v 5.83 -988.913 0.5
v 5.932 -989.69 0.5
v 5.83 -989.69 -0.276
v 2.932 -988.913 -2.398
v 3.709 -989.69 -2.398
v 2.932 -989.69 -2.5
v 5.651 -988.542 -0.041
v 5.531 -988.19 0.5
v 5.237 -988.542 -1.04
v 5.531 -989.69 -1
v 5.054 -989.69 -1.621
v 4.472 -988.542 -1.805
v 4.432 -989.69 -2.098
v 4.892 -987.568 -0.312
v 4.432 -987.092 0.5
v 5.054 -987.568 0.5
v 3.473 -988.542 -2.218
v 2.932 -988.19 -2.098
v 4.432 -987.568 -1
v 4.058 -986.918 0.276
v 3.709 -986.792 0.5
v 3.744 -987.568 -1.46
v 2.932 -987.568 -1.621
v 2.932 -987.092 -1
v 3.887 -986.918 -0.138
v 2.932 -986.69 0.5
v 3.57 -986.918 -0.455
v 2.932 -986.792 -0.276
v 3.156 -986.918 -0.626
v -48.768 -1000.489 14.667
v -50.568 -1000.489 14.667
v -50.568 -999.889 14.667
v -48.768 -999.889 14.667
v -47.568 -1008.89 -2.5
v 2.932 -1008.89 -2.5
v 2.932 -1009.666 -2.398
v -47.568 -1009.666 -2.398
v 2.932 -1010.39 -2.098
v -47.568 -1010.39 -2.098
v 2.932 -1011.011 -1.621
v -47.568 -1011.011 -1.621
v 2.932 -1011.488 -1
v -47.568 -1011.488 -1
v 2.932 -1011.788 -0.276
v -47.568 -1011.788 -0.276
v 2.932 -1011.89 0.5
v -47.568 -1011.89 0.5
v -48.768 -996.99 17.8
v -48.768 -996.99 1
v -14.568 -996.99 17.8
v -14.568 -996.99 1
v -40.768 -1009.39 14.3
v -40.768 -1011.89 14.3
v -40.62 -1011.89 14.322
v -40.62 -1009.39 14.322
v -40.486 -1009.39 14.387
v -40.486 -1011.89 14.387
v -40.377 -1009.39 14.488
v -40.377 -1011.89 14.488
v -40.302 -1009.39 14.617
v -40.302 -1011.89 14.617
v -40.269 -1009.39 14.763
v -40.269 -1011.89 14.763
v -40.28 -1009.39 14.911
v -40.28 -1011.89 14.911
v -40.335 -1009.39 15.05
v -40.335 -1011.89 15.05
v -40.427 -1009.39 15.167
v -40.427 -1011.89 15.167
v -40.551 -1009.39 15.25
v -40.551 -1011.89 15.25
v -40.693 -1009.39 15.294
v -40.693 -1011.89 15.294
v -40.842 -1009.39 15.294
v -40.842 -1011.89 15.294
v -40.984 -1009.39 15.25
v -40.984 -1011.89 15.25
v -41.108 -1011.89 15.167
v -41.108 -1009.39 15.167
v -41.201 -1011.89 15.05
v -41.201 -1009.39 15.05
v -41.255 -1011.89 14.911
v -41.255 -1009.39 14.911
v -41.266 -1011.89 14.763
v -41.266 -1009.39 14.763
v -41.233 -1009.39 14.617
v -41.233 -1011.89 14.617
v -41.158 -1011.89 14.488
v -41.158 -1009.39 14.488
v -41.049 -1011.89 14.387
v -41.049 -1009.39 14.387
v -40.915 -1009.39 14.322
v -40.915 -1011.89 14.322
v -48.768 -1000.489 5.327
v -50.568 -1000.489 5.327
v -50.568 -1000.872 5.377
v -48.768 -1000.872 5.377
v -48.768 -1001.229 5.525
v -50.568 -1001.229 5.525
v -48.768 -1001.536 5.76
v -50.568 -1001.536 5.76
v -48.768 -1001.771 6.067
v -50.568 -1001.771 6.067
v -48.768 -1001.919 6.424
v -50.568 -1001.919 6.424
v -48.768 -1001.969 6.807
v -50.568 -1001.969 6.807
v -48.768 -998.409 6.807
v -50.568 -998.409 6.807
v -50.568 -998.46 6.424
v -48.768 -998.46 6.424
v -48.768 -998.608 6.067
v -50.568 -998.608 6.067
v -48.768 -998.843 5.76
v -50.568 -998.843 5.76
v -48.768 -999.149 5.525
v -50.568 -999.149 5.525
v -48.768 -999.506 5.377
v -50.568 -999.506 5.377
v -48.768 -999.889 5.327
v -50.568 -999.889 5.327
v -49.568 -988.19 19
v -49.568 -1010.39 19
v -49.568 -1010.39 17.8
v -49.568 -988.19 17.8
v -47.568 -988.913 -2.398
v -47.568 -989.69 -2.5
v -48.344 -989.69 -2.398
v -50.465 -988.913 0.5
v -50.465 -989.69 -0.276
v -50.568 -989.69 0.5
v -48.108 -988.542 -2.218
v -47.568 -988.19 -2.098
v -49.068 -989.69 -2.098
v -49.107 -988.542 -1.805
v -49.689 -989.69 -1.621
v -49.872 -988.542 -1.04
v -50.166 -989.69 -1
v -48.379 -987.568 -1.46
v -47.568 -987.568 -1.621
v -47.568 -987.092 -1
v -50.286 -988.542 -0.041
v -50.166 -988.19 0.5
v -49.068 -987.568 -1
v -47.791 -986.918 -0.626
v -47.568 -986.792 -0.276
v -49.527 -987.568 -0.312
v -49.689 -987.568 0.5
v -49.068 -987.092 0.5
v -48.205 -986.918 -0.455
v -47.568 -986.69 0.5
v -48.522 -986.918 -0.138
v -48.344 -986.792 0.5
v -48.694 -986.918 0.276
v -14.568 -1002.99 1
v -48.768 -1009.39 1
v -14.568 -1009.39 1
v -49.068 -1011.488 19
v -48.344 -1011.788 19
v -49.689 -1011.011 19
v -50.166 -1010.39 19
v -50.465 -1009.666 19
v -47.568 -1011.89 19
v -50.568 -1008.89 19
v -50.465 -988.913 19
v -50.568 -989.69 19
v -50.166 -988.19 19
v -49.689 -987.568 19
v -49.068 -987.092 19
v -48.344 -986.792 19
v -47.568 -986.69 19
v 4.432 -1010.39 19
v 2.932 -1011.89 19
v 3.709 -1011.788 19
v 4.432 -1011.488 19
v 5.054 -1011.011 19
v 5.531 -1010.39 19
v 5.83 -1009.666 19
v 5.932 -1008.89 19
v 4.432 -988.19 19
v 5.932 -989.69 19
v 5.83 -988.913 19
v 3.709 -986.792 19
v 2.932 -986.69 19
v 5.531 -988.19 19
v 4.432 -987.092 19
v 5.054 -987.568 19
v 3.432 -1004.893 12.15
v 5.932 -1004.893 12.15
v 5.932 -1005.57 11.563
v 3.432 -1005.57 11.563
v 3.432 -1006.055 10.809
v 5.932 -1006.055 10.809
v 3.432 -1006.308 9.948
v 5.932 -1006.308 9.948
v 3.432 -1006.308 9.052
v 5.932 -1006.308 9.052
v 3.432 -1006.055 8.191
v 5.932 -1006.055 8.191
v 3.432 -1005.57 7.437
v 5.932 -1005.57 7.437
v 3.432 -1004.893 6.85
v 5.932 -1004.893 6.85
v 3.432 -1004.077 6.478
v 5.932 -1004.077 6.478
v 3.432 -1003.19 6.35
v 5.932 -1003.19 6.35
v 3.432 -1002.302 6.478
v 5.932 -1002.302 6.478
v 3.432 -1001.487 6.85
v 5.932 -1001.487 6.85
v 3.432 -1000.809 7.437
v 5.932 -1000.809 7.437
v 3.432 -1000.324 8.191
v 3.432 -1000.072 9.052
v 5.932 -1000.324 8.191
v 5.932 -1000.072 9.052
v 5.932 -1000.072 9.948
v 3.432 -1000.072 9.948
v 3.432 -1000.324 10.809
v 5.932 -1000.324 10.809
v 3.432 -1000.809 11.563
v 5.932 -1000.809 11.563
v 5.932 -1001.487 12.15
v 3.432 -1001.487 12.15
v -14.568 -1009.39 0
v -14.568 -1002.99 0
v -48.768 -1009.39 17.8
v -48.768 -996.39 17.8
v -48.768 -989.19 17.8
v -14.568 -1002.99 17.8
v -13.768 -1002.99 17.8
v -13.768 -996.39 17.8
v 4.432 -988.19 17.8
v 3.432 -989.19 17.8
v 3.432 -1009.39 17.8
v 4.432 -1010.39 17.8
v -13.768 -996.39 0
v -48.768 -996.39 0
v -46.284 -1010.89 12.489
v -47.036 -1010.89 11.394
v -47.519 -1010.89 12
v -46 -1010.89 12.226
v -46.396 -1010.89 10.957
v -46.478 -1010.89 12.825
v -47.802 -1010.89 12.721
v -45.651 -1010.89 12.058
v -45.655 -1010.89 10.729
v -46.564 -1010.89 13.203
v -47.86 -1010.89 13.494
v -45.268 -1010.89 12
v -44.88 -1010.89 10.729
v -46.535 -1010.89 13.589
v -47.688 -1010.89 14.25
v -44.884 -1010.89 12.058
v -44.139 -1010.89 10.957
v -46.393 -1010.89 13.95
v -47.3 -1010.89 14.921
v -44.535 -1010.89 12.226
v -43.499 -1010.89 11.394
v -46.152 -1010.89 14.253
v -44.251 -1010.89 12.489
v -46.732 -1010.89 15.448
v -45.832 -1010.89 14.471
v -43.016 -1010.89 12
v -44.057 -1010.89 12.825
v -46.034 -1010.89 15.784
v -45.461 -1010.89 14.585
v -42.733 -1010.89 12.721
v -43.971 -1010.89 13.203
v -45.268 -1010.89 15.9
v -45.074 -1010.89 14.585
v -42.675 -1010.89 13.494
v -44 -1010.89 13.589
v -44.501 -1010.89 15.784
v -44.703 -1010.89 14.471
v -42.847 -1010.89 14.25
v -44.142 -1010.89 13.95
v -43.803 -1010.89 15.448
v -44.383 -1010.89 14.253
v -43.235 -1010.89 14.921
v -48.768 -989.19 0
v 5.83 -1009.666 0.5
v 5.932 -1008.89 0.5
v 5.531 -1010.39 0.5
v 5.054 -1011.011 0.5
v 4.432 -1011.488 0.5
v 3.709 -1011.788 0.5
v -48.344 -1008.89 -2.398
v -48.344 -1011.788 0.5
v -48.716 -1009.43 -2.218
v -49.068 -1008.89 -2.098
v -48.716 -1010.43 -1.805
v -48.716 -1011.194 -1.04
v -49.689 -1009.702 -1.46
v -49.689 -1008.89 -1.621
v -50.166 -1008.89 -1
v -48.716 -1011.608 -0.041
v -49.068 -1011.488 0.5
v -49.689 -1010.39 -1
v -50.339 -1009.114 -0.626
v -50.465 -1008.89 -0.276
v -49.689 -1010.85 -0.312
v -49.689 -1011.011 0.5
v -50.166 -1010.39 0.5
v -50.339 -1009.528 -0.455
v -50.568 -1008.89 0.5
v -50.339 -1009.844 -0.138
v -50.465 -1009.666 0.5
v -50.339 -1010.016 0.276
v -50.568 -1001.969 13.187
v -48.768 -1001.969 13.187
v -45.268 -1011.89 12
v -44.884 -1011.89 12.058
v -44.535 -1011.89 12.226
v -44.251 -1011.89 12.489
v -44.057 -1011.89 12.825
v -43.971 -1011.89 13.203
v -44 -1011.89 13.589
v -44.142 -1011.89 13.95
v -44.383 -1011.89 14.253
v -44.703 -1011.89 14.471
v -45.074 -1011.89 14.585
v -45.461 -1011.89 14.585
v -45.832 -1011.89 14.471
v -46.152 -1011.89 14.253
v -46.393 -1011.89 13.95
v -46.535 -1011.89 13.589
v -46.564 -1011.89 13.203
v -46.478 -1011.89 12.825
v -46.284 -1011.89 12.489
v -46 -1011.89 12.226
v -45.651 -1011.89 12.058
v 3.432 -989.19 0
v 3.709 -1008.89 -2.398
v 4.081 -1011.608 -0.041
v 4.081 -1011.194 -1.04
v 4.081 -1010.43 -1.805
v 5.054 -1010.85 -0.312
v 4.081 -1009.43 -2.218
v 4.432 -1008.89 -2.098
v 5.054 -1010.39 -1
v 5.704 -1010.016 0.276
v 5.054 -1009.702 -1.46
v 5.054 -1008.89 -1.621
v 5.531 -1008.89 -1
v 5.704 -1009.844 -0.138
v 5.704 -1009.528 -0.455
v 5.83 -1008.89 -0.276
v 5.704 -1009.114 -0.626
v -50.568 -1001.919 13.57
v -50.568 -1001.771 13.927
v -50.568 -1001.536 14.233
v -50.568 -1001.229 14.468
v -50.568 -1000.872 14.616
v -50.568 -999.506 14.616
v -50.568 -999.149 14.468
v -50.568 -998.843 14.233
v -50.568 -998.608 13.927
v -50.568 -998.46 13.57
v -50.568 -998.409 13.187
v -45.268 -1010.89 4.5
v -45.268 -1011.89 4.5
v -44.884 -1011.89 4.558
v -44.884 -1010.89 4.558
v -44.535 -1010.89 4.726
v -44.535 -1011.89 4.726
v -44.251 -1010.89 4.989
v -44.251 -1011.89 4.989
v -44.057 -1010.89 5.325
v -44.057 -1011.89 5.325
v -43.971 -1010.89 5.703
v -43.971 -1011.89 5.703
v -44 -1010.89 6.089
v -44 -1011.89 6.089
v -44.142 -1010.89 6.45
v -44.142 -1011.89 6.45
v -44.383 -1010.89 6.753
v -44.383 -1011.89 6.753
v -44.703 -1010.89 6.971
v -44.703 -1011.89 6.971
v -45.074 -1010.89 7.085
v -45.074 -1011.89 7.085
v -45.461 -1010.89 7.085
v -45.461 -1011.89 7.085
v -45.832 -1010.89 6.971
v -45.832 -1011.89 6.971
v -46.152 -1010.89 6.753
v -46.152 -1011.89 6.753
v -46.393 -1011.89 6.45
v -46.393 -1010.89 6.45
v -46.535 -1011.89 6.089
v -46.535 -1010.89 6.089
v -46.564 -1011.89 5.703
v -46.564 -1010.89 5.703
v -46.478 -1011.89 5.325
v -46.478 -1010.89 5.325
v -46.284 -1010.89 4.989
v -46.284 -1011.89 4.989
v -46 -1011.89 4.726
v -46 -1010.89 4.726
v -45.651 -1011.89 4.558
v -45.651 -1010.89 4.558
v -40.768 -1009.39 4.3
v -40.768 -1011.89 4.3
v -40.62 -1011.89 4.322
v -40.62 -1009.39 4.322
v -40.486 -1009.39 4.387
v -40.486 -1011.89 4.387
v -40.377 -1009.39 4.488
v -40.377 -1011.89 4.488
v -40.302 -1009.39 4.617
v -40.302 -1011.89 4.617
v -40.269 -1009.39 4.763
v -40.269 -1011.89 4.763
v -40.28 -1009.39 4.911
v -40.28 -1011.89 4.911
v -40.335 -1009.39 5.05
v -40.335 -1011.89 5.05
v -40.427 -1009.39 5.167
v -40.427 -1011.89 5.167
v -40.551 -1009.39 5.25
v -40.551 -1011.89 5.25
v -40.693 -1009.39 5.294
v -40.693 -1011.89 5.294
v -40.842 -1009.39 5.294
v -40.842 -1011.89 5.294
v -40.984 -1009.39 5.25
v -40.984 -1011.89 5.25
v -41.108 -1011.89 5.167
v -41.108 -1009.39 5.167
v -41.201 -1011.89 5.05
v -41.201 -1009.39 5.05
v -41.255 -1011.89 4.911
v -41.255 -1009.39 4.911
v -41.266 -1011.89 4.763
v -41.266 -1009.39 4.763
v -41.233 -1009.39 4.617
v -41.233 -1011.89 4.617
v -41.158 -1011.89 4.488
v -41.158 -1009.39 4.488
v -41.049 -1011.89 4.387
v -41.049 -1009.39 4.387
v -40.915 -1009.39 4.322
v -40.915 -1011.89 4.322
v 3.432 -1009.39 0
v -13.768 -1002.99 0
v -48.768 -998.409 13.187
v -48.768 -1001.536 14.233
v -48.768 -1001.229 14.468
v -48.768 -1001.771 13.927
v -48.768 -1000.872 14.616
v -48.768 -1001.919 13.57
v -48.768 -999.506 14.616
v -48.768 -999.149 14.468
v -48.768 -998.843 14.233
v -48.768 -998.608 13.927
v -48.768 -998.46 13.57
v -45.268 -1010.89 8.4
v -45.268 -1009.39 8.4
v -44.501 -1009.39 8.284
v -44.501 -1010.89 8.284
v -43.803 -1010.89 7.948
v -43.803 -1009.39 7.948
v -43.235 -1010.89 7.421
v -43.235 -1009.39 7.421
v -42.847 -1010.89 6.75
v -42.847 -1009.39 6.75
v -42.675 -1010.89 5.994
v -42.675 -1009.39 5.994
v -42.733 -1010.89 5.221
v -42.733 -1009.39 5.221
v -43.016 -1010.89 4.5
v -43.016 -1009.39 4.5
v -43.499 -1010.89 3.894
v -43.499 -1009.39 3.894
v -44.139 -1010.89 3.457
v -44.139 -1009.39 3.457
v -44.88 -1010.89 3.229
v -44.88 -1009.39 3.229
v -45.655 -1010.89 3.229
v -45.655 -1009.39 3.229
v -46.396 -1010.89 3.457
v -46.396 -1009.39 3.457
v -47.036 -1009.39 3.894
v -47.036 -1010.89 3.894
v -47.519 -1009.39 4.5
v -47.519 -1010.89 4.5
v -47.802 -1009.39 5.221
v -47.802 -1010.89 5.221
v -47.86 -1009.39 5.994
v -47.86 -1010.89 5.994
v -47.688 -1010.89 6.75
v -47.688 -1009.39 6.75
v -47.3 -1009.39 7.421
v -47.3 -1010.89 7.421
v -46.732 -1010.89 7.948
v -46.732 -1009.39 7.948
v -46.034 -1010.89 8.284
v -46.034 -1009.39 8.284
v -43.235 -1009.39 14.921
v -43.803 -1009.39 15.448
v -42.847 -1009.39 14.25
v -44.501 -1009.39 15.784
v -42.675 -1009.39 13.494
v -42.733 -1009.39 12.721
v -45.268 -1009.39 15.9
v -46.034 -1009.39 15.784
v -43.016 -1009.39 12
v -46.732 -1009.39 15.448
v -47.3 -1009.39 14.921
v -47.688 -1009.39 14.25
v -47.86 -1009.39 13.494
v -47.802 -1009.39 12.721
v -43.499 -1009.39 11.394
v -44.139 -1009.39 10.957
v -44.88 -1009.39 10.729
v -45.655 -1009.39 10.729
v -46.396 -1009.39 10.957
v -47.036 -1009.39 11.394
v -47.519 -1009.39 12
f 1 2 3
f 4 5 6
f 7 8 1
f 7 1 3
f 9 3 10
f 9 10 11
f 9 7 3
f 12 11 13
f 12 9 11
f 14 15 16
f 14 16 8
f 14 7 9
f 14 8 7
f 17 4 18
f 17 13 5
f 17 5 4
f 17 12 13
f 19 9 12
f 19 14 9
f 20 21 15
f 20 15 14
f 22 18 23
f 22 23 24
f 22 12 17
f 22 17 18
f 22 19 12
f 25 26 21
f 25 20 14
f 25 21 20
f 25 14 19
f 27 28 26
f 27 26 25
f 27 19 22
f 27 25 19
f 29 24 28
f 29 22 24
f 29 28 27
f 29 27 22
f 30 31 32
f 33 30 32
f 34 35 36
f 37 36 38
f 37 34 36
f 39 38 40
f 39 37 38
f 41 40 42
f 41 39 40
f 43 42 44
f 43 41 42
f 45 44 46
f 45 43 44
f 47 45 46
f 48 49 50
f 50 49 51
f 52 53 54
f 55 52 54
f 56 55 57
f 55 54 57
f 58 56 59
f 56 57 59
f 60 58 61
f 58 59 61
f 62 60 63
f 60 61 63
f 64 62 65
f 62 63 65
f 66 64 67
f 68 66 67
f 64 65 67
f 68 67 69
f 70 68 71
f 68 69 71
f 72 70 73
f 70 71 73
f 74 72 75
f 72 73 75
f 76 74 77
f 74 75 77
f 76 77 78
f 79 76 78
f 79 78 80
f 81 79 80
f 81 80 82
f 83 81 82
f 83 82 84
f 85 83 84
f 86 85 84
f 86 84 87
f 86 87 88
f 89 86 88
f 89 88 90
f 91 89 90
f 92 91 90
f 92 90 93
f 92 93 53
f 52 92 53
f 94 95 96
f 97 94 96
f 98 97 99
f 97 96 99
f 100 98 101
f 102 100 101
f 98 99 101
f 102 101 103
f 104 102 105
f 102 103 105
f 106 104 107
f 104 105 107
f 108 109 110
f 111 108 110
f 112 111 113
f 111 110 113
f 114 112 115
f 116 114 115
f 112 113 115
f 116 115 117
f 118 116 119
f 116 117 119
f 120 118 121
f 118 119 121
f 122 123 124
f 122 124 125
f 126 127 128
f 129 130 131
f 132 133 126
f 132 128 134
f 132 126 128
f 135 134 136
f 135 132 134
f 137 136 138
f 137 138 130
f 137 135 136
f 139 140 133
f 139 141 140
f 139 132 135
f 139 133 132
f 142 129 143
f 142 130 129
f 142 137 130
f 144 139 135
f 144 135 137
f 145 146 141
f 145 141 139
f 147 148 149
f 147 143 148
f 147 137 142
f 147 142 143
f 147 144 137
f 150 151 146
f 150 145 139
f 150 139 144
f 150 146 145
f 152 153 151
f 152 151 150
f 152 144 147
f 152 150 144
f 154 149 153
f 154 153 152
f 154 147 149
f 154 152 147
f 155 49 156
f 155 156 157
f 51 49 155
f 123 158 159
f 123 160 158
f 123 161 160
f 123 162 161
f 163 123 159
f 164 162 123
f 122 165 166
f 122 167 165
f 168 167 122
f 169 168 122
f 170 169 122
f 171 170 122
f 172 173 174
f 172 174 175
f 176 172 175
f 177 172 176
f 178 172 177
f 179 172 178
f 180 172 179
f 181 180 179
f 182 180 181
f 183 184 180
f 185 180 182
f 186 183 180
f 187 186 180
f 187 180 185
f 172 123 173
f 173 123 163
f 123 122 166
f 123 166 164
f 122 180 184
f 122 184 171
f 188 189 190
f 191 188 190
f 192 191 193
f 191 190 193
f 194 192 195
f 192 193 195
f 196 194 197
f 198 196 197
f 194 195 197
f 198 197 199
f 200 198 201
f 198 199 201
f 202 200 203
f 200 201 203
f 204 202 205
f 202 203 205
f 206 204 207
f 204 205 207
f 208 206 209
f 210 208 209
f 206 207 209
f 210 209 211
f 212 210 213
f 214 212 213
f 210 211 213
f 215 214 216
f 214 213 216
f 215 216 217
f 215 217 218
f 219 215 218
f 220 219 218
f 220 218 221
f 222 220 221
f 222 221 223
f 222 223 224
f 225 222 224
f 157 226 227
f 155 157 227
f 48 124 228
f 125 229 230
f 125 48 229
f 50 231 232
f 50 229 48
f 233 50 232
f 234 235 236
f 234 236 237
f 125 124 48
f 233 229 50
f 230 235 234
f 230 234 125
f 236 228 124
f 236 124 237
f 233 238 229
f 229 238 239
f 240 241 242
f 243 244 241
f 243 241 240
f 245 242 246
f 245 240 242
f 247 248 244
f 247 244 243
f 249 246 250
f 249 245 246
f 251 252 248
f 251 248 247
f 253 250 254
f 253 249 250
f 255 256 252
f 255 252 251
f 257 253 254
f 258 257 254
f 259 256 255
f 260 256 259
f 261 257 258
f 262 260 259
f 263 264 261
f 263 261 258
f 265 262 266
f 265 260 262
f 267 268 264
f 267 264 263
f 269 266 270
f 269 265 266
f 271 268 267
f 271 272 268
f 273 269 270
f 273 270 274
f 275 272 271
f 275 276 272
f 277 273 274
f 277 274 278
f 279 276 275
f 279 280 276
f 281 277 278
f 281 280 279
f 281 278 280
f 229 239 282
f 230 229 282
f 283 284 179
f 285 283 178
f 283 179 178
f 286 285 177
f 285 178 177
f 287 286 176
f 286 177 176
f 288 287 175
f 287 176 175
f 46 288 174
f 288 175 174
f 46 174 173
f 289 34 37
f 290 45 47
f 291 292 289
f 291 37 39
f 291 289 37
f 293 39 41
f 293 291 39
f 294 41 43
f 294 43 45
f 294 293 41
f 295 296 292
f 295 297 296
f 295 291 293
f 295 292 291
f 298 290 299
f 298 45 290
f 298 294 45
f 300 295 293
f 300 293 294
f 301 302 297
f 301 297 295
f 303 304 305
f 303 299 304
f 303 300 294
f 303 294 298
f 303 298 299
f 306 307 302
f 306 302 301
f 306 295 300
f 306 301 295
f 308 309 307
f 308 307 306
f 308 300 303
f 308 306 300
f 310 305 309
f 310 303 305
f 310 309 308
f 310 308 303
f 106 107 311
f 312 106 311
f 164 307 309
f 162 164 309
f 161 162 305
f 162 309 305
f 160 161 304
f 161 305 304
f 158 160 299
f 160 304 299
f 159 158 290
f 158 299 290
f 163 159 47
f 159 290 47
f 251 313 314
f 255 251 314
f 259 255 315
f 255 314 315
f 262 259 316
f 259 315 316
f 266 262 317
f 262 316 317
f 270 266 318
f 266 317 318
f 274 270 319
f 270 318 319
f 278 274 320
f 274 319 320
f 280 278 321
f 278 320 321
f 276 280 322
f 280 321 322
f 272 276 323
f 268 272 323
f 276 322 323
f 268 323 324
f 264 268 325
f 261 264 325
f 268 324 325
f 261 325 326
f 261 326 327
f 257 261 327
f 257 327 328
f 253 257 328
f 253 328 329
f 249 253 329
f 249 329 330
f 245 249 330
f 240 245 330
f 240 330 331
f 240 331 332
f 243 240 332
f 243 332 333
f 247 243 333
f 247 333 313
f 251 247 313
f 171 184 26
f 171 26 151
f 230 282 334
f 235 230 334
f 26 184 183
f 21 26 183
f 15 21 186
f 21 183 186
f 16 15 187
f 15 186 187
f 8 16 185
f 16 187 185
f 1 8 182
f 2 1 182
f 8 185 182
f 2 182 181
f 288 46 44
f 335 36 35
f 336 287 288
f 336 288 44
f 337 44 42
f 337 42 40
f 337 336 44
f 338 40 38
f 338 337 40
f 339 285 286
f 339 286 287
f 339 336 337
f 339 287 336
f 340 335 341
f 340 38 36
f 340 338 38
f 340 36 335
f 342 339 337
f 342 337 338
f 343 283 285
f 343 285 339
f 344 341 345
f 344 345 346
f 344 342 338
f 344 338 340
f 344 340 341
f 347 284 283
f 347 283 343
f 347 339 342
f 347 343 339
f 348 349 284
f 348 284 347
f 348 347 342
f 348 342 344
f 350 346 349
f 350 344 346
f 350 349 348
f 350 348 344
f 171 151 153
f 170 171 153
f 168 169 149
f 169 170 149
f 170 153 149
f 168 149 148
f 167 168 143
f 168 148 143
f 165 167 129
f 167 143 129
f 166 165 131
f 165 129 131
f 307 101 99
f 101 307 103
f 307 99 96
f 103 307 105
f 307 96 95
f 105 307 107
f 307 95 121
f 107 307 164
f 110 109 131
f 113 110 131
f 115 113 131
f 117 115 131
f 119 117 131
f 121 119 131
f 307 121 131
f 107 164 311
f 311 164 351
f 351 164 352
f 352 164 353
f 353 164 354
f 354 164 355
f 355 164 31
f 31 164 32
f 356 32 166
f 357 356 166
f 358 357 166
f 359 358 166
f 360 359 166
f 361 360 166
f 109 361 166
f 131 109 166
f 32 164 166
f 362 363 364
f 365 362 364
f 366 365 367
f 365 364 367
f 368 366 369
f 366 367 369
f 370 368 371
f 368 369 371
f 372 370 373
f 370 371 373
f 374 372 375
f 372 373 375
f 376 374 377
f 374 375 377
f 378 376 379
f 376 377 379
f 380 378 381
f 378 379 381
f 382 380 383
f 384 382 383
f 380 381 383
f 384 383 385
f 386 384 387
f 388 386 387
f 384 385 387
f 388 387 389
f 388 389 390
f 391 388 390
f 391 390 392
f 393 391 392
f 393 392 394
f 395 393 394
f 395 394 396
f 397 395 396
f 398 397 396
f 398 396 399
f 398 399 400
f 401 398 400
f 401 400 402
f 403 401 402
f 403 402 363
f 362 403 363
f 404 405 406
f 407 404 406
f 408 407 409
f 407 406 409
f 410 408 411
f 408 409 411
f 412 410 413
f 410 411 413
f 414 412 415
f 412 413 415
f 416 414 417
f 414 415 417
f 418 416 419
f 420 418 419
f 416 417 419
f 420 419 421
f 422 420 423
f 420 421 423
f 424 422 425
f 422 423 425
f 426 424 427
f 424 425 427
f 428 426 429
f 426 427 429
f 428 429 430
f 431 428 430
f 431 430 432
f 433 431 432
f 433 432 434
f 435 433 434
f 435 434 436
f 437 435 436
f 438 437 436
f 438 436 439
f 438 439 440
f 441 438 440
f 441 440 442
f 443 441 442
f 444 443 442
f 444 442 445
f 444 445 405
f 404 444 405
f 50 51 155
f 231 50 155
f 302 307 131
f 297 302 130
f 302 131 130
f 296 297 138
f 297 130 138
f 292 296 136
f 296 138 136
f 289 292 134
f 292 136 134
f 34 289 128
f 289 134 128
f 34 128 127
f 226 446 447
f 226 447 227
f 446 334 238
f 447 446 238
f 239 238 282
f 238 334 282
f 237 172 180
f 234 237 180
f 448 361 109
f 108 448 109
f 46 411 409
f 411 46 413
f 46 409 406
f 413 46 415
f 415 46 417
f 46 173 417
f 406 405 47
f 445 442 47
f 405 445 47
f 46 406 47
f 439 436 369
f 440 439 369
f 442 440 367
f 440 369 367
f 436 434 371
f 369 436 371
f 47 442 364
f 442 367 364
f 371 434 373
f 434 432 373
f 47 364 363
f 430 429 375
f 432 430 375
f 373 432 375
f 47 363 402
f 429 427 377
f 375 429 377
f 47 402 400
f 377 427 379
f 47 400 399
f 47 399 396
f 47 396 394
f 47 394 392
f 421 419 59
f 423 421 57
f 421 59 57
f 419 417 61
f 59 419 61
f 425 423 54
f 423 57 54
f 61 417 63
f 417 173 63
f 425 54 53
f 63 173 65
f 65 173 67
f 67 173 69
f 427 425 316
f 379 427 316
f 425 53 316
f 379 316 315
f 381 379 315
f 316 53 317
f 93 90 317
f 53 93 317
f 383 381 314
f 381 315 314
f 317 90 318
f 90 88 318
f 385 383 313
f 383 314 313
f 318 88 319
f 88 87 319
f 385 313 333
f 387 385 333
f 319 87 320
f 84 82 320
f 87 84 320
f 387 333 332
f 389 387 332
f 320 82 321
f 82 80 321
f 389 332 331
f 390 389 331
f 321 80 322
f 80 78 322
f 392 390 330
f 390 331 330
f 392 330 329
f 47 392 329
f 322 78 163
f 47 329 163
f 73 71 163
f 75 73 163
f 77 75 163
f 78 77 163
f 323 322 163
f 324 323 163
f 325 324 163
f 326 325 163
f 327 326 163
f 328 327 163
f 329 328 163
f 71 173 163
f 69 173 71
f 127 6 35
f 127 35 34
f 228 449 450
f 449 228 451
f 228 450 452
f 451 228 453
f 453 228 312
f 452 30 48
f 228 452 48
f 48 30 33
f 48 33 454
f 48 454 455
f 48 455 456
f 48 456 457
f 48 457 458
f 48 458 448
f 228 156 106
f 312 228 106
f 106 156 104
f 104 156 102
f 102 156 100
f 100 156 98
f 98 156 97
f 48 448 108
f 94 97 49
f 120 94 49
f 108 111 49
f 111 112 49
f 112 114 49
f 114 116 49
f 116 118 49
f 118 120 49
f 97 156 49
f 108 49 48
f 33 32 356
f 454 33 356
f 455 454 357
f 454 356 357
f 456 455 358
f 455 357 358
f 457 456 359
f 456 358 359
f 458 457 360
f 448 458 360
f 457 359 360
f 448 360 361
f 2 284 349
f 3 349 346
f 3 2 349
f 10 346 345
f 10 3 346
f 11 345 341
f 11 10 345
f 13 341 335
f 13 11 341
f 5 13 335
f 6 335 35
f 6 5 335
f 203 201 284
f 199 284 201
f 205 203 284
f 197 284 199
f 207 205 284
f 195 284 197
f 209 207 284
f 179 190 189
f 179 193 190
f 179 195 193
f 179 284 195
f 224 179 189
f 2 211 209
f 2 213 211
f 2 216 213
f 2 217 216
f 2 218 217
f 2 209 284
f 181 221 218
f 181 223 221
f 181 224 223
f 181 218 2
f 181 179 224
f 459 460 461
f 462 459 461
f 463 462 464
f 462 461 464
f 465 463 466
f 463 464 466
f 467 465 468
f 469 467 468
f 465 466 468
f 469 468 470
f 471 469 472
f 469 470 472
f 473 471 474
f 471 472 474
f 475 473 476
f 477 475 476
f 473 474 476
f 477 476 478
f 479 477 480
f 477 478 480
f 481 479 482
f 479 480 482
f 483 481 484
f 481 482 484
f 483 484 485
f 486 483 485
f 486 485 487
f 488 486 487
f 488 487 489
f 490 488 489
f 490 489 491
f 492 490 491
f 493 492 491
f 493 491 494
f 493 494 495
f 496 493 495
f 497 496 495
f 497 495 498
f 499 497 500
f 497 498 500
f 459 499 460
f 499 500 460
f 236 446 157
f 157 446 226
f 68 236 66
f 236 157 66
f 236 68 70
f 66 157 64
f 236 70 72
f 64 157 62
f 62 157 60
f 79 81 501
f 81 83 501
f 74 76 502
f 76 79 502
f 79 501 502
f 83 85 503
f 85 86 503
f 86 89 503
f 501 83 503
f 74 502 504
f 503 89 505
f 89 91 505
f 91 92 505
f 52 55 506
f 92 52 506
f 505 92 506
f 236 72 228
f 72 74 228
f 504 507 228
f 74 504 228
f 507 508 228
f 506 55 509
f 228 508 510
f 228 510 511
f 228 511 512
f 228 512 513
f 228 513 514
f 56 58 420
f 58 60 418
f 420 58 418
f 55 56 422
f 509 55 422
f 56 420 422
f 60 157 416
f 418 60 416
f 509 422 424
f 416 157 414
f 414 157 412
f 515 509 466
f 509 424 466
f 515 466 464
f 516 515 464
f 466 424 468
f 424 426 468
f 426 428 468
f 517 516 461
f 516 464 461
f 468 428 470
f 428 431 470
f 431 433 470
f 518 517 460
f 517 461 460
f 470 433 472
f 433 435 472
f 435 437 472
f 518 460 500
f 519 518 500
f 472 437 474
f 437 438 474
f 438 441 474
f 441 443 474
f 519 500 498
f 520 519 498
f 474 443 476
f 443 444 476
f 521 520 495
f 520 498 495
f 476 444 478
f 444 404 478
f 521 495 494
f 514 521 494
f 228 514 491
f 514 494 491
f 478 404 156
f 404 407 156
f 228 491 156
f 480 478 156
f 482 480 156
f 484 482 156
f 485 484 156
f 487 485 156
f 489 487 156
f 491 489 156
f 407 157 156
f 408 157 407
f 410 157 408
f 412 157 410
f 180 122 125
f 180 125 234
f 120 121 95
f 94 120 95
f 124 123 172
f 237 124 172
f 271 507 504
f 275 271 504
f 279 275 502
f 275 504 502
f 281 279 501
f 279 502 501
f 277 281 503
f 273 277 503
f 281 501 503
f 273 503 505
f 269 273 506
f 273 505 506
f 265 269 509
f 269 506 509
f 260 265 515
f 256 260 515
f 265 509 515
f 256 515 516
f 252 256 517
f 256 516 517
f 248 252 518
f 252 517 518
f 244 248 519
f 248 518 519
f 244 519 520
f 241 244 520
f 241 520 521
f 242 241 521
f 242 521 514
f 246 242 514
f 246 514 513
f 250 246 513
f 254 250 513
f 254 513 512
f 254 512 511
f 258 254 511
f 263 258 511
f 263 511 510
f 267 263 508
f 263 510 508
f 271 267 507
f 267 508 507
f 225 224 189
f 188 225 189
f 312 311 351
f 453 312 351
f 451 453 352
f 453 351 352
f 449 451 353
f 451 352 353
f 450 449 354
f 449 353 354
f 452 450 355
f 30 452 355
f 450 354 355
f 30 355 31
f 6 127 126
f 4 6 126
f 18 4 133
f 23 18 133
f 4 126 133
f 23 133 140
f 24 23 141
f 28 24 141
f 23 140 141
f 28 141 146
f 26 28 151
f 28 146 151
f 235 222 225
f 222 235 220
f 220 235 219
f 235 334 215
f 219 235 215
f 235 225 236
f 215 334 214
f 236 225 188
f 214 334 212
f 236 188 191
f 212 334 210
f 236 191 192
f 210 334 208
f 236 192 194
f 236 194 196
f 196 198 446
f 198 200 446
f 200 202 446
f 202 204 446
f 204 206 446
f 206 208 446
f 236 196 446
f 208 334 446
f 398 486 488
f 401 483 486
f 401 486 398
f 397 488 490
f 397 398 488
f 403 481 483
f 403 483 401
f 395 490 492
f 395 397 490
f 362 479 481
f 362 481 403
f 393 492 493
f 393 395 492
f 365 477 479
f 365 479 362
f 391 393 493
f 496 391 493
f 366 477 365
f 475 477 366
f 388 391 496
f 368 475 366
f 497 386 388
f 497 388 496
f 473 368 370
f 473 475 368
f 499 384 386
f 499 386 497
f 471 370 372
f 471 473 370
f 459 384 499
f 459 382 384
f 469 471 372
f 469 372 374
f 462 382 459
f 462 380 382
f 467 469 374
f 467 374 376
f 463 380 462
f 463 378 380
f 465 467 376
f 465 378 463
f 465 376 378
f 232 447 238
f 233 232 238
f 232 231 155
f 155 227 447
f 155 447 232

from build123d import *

# Parameters (mm, degrees)
SKETCH_1_W          = 56.5
SKETCH_1_H          = 25.2
EXTRUDE_1_DEPTH     = 19
SKETCH_2_W          = 56.5
SKETCH_2_H          = 25.2
EXTRUDE_2_DEPTH     = 2.5
SKETCH_3_W          = 34.2
SKETCH_3_H          = 12.4
EXTRUDE_3_DEPTH     = 1
CUT_EXTRUDE_1_DEPTH = 1.8
SKETCH_5_W          = 54
SKETCH_5_H          = 22.2
CUT_EXTRUDE_2_DEPTH = 1.2
CUT_EXTRUDE_3_DEPTH = 4.2
FILLET_1_R          = 3
FILLET_2_R          = 3
SKETCH_8_R          = 1.3
CUT_EXTRUDE_4_DEPTH = 4.2
SKETCH_9_R          = 2.6
CUT_EXTRUDE_5_DEPTH = 1.5
SKETCH_10_R         = 0.5
CUT_EXTRUDE_6_DEPTH = 4


with BuildPart() as part:
    # Эскиз1 → Бобышка-Вытянуть1 (new body)
    with BuildSketch(Plane.XY):
        with Locations((-22.317513824, -999.289755901)):
            Rectangle(SKETCH_1_W, SKETCH_1_H)
        Polygon((-48.767513824, -989.189755901), (3.432486176, -989.189755901), (3.432486176, -1009.389755901), (-48.767513824, -1009.389755901), (-48.767513824, -996.989755901), (-14.567513824, -996.989755901), (-14.567513824, -1002.989755901), (-13.767513824, -1002.989755901), (-13.767513824, -996.989755901), (-13.767513824, -996.389755901), (-48.767513824, -996.389755901), align=None, mode=Mode.SUBTRACT)
    extrude(amount=EXTRUDE_1_DEPTH)

    # Эскиз2 → Бобышка-Вытянуть2 (add)
    with BuildSketch(Plane(origin=(0, 0, 0), x_dir=(-1, 0, 0), z_dir=(0, 0, -1))):
        with Locations((22.317513824, -999.289755901)):
            Rectangle(SKETCH_2_W, SKETCH_2_H)
    extrude(amount=EXTRUDE_2_DEPTH)

    # Эскиз3 → Бобышка-Вытянуть3 (add)
    with BuildSketch(Plane.XY):
        with Locations((-31.667513824, -1003.189755901)):
            Rectangle(SKETCH_3_W, SKETCH_3_H)
    extrude(amount=EXTRUDE_3_DEPTH)

    # Эскиз4 → Вырез-Вытянуть1 (cut)
    with BuildSketch(Plane.ZY.offset(50.567513824)):
        with BuildLine():
            Line((14.666630398, -1000.489317936), (14.666630398, -999.889317936))
            ThreePointArc((14.666630398, -999.889317936), (14.233148434, -998.8427999), (13.186630398, -998.409317936))
            Line((13.186630398, -998.409317936), (6.806630398, -998.409317936))
            ThreePointArc((6.806630398, -998.409317936), (5.760112362, -998.8427999), (5.326630398, -999.889317936))
            Line((5.326630398, -999.889317936), (5.326630398, -1000.489317936))
            ThreePointArc((5.326630398, -1000.489317936), (5.760112362, -1001.535835972), (6.806630398, -1001.969317936))
            Line((6.806630398, -1001.969317936), (13.186630398, -1001.969317936))
            ThreePointArc((13.186630398, -1001.969317936), (14.233148434, -1001.535835972), (14.666630398, -1000.489317936))
        make_face()
    extrude(amount=-CUT_EXTRUDE_1_DEPTH, mode=Mode.SUBTRACT)

    # Эскиз5 → Вырез-Вытянуть2 (cut)
    with BuildSketch(Plane.XY.offset(19)):
        with Locations((-22.567513824, -999.289755901)):
            Rectangle(SKETCH_5_W, SKETCH_5_H)
    extrude(amount=-CUT_EXTRUDE_2_DEPTH, mode=Mode.SUBTRACT)

    # Эскиз7 → Вырез-Вытянуть3 (cut)
    with BuildSketch(Plane(origin=(5.932486176, 0, 0), x_dir=(0, 0, -1), z_dir=(1, 0, 0))):
        with BuildLine():
            Line((-12.15, -1001.486817264), (-12.15, -1004.892694537))
            ThreePointArc((-12.15, -1004.892694537), (-6.35, -1003.189755901), (-12.15, -1001.486817264))
        make_face()
    extrude(amount=-CUT_EXTRUDE_3_DEPTH, mode=Mode.SUBTRACT)

    # Скругление1
    fillet_1_edges = [part.edges().sort_by_distance(p)[0] for p in [
        (5.932486176, -999.289755901, -2.5),
        (-22.317513824, -1011.889755901, -2.5),
        (-50.567513824, -999.289755901, -2.5),
        (-22.317513824, -986.689755901, -2.5),
    ]]
    fillet(fillet_1_edges, radius=FILLET_1_R)

    # Скругление2
    # the kernel refuses this fillet: 3 mm, written as the material it takes off along each edge
    with BuildSketch(Plane(origin=(-47.567513824, -1008.889755901, 0.5), x_dir=(0, -1, 0), z_dir=(-1, 0, 0))) as fillet_2_piece_1_section:
        Polygon((0, 0), (FILLET_2_R, 0), (FILLET_2_R, -FILLET_2_R), (0, -FILLET_2_R), align=None)
    fillet_2_piece_1 = extrude(amount=FILLET_2_R, mode=Mode.PRIVATE)
    fillet_2_piece_1 = fillet_2_piece_1 - Plane(origin=(-47.567513824, -1008.889755901, 0.5), x_dir=(0, 0.7071067811865475, 0.7071067811865475), z_dir=(-1, 0, 0)) * Sphere(FILLET_2_R, mode=Mode.PRIVATE)
    add(fillet_2_piece_1, mode=Mode.SUBTRACT)
    with BuildSketch(Plane(origin=(2.932486176, -1008.889755901, 0.5), x_dir=(0, -1, 0), z_dir=(1, 0, 0))) as fillet_2_piece_2_section:
        Polygon((0, 0), (FILLET_2_R, 0), (FILLET_2_R, FILLET_2_R), (0, FILLET_2_R), align=None)
    fillet_2_piece_2 = extrude(amount=FILLET_2_R, mode=Mode.PRIVATE)
    fillet_2_piece_2 = fillet_2_piece_2 - Plane(origin=(2.932486176, -1008.889755901, 0.5), x_dir=(0, 0.7071067811865475, 0.7071067811865475), z_dir=(1, 0, 0)) * Sphere(FILLET_2_R, mode=Mode.PRIVATE)
    add(fillet_2_piece_2, mode=Mode.SUBTRACT)
    with BuildSketch(Plane(origin=(-47.567513824, -989.689755901, 0.5), x_dir=(-1, 0, 0), z_dir=(0, 1, 0))) as fillet_2_piece_3_section:
        Polygon((0, 0), (FILLET_2_R, 0), (FILLET_2_R, -FILLET_2_R), (0, -FILLET_2_R), align=None)
    fillet_2_piece_3 = extrude(amount=FILLET_2_R, mode=Mode.PRIVATE)
    fillet_2_piece_3 = fillet_2_piece_3 - Plane(origin=(-47.567513824, -989.689755901, 0.5), x_dir=(0.7071067811865475, 0, 0.7071067811865475), z_dir=(0, 1, 0)) * Sphere(FILLET_2_R, mode=Mode.PRIVATE)
    add(fillet_2_piece_3, mode=Mode.SUBTRACT)
    with BuildSketch(Plane(origin=(2.932486176, -989.689755901, 0.5), x_dir=(1, 0, 0), z_dir=(0, 1, 0))) as fillet_2_piece_4_section:
        Polygon((0, 0), (FILLET_2_R, 0), (FILLET_2_R, FILLET_2_R), (0, FILLET_2_R), align=None)
    fillet_2_piece_4 = extrude(amount=FILLET_2_R, mode=Mode.PRIVATE)
    fillet_2_piece_4 = fillet_2_piece_4 - Plane(origin=(2.932486176, -989.689755901, 0.5), x_dir=(-0.7071067811865475, 0, 0.7071067811865475), z_dir=(0, 1, 0)) * Sphere(FILLET_2_R, mode=Mode.PRIVATE)
    add(fillet_2_piece_4, mode=Mode.SUBTRACT)
    with BuildSketch(Plane(origin=(-50.567513824, -986.689755901, 0.5), x_dir=(1, 0, 0), z_dir=(0, 0, 1)), Plane(origin=(5.932486176, -986.689755901, 26.5), x_dir=(-1, 0, 0), z_dir=(0, 0, -1)), Plane(origin=(5.932486176, -1011.889755901, 26.5), x_dir=(0, 1, 0), z_dir=(0, 0, -1)), Plane(origin=(-50.567513824, -1011.889755901, 0.5), x_dir=(0, 1, 0), z_dir=(0, 0, 1))) as fillet_2_piece_5:
        with BuildLine():
            CenterArc((FILLET_2_R, -FILLET_2_R), FILLET_2_R, 90, 90)
            Line((0, -FILLET_2_R), (0, 0))
            Line((0, 0), (FILLET_2_R, 0))
        make_face()
    extrude(amount=26, mode=Mode.SUBTRACT)

    # Эскиз8 → Вырез-Вытянуть4 (cut)
    with BuildSketch(Plane.XZ.offset(1011.889755901)):
        with Locations(Location((-45.267513824, 5.8, 0), (0, 0, 270))):
            Circle(SKETCH_8_R)
        with Locations(Location((-45.267513824, 13.3, 0), (0, 0, 270))):
            Circle(SKETCH_8_R)
    extrude(amount=-CUT_EXTRUDE_4_DEPTH, mode=Mode.SUBTRACT)

    # Эскиз9 → Вырез-Вытянуть5 (cut)
    with BuildSketch(Plane(origin=(0, -1009.389755901, 0), x_dir=(1, 0, 0), z_dir=(0, 1, 0))):
        with Locations(Location((-45.267513824, -5.8, 0), (0, 0, 270))):
            Circle(SKETCH_9_R)
        with Locations(Location((-45.267513824, -13.3, 0), (0, 0, 270))):
            Circle(SKETCH_9_R)
    extrude(amount=-CUT_EXTRUDE_5_DEPTH, mode=Mode.SUBTRACT)

    # Эскиз10 → Вырез-Вытянуть6 (cut)
    with BuildSketch(Plane.XZ.offset(1011.889755901)):
        with Locations(Location((-40.767513824, 4.8, 0), (0, 0, 270))):
            Circle(SKETCH_10_R)
        with Locations(Location((-40.767513824, 14.8, 0), (0, 0, 270))):
            Circle(SKETCH_10_R)
    extrude(amount=-CUT_EXTRUDE_6_DEPTH, mode=Mode.SUBTRACT)


solid = part.part
